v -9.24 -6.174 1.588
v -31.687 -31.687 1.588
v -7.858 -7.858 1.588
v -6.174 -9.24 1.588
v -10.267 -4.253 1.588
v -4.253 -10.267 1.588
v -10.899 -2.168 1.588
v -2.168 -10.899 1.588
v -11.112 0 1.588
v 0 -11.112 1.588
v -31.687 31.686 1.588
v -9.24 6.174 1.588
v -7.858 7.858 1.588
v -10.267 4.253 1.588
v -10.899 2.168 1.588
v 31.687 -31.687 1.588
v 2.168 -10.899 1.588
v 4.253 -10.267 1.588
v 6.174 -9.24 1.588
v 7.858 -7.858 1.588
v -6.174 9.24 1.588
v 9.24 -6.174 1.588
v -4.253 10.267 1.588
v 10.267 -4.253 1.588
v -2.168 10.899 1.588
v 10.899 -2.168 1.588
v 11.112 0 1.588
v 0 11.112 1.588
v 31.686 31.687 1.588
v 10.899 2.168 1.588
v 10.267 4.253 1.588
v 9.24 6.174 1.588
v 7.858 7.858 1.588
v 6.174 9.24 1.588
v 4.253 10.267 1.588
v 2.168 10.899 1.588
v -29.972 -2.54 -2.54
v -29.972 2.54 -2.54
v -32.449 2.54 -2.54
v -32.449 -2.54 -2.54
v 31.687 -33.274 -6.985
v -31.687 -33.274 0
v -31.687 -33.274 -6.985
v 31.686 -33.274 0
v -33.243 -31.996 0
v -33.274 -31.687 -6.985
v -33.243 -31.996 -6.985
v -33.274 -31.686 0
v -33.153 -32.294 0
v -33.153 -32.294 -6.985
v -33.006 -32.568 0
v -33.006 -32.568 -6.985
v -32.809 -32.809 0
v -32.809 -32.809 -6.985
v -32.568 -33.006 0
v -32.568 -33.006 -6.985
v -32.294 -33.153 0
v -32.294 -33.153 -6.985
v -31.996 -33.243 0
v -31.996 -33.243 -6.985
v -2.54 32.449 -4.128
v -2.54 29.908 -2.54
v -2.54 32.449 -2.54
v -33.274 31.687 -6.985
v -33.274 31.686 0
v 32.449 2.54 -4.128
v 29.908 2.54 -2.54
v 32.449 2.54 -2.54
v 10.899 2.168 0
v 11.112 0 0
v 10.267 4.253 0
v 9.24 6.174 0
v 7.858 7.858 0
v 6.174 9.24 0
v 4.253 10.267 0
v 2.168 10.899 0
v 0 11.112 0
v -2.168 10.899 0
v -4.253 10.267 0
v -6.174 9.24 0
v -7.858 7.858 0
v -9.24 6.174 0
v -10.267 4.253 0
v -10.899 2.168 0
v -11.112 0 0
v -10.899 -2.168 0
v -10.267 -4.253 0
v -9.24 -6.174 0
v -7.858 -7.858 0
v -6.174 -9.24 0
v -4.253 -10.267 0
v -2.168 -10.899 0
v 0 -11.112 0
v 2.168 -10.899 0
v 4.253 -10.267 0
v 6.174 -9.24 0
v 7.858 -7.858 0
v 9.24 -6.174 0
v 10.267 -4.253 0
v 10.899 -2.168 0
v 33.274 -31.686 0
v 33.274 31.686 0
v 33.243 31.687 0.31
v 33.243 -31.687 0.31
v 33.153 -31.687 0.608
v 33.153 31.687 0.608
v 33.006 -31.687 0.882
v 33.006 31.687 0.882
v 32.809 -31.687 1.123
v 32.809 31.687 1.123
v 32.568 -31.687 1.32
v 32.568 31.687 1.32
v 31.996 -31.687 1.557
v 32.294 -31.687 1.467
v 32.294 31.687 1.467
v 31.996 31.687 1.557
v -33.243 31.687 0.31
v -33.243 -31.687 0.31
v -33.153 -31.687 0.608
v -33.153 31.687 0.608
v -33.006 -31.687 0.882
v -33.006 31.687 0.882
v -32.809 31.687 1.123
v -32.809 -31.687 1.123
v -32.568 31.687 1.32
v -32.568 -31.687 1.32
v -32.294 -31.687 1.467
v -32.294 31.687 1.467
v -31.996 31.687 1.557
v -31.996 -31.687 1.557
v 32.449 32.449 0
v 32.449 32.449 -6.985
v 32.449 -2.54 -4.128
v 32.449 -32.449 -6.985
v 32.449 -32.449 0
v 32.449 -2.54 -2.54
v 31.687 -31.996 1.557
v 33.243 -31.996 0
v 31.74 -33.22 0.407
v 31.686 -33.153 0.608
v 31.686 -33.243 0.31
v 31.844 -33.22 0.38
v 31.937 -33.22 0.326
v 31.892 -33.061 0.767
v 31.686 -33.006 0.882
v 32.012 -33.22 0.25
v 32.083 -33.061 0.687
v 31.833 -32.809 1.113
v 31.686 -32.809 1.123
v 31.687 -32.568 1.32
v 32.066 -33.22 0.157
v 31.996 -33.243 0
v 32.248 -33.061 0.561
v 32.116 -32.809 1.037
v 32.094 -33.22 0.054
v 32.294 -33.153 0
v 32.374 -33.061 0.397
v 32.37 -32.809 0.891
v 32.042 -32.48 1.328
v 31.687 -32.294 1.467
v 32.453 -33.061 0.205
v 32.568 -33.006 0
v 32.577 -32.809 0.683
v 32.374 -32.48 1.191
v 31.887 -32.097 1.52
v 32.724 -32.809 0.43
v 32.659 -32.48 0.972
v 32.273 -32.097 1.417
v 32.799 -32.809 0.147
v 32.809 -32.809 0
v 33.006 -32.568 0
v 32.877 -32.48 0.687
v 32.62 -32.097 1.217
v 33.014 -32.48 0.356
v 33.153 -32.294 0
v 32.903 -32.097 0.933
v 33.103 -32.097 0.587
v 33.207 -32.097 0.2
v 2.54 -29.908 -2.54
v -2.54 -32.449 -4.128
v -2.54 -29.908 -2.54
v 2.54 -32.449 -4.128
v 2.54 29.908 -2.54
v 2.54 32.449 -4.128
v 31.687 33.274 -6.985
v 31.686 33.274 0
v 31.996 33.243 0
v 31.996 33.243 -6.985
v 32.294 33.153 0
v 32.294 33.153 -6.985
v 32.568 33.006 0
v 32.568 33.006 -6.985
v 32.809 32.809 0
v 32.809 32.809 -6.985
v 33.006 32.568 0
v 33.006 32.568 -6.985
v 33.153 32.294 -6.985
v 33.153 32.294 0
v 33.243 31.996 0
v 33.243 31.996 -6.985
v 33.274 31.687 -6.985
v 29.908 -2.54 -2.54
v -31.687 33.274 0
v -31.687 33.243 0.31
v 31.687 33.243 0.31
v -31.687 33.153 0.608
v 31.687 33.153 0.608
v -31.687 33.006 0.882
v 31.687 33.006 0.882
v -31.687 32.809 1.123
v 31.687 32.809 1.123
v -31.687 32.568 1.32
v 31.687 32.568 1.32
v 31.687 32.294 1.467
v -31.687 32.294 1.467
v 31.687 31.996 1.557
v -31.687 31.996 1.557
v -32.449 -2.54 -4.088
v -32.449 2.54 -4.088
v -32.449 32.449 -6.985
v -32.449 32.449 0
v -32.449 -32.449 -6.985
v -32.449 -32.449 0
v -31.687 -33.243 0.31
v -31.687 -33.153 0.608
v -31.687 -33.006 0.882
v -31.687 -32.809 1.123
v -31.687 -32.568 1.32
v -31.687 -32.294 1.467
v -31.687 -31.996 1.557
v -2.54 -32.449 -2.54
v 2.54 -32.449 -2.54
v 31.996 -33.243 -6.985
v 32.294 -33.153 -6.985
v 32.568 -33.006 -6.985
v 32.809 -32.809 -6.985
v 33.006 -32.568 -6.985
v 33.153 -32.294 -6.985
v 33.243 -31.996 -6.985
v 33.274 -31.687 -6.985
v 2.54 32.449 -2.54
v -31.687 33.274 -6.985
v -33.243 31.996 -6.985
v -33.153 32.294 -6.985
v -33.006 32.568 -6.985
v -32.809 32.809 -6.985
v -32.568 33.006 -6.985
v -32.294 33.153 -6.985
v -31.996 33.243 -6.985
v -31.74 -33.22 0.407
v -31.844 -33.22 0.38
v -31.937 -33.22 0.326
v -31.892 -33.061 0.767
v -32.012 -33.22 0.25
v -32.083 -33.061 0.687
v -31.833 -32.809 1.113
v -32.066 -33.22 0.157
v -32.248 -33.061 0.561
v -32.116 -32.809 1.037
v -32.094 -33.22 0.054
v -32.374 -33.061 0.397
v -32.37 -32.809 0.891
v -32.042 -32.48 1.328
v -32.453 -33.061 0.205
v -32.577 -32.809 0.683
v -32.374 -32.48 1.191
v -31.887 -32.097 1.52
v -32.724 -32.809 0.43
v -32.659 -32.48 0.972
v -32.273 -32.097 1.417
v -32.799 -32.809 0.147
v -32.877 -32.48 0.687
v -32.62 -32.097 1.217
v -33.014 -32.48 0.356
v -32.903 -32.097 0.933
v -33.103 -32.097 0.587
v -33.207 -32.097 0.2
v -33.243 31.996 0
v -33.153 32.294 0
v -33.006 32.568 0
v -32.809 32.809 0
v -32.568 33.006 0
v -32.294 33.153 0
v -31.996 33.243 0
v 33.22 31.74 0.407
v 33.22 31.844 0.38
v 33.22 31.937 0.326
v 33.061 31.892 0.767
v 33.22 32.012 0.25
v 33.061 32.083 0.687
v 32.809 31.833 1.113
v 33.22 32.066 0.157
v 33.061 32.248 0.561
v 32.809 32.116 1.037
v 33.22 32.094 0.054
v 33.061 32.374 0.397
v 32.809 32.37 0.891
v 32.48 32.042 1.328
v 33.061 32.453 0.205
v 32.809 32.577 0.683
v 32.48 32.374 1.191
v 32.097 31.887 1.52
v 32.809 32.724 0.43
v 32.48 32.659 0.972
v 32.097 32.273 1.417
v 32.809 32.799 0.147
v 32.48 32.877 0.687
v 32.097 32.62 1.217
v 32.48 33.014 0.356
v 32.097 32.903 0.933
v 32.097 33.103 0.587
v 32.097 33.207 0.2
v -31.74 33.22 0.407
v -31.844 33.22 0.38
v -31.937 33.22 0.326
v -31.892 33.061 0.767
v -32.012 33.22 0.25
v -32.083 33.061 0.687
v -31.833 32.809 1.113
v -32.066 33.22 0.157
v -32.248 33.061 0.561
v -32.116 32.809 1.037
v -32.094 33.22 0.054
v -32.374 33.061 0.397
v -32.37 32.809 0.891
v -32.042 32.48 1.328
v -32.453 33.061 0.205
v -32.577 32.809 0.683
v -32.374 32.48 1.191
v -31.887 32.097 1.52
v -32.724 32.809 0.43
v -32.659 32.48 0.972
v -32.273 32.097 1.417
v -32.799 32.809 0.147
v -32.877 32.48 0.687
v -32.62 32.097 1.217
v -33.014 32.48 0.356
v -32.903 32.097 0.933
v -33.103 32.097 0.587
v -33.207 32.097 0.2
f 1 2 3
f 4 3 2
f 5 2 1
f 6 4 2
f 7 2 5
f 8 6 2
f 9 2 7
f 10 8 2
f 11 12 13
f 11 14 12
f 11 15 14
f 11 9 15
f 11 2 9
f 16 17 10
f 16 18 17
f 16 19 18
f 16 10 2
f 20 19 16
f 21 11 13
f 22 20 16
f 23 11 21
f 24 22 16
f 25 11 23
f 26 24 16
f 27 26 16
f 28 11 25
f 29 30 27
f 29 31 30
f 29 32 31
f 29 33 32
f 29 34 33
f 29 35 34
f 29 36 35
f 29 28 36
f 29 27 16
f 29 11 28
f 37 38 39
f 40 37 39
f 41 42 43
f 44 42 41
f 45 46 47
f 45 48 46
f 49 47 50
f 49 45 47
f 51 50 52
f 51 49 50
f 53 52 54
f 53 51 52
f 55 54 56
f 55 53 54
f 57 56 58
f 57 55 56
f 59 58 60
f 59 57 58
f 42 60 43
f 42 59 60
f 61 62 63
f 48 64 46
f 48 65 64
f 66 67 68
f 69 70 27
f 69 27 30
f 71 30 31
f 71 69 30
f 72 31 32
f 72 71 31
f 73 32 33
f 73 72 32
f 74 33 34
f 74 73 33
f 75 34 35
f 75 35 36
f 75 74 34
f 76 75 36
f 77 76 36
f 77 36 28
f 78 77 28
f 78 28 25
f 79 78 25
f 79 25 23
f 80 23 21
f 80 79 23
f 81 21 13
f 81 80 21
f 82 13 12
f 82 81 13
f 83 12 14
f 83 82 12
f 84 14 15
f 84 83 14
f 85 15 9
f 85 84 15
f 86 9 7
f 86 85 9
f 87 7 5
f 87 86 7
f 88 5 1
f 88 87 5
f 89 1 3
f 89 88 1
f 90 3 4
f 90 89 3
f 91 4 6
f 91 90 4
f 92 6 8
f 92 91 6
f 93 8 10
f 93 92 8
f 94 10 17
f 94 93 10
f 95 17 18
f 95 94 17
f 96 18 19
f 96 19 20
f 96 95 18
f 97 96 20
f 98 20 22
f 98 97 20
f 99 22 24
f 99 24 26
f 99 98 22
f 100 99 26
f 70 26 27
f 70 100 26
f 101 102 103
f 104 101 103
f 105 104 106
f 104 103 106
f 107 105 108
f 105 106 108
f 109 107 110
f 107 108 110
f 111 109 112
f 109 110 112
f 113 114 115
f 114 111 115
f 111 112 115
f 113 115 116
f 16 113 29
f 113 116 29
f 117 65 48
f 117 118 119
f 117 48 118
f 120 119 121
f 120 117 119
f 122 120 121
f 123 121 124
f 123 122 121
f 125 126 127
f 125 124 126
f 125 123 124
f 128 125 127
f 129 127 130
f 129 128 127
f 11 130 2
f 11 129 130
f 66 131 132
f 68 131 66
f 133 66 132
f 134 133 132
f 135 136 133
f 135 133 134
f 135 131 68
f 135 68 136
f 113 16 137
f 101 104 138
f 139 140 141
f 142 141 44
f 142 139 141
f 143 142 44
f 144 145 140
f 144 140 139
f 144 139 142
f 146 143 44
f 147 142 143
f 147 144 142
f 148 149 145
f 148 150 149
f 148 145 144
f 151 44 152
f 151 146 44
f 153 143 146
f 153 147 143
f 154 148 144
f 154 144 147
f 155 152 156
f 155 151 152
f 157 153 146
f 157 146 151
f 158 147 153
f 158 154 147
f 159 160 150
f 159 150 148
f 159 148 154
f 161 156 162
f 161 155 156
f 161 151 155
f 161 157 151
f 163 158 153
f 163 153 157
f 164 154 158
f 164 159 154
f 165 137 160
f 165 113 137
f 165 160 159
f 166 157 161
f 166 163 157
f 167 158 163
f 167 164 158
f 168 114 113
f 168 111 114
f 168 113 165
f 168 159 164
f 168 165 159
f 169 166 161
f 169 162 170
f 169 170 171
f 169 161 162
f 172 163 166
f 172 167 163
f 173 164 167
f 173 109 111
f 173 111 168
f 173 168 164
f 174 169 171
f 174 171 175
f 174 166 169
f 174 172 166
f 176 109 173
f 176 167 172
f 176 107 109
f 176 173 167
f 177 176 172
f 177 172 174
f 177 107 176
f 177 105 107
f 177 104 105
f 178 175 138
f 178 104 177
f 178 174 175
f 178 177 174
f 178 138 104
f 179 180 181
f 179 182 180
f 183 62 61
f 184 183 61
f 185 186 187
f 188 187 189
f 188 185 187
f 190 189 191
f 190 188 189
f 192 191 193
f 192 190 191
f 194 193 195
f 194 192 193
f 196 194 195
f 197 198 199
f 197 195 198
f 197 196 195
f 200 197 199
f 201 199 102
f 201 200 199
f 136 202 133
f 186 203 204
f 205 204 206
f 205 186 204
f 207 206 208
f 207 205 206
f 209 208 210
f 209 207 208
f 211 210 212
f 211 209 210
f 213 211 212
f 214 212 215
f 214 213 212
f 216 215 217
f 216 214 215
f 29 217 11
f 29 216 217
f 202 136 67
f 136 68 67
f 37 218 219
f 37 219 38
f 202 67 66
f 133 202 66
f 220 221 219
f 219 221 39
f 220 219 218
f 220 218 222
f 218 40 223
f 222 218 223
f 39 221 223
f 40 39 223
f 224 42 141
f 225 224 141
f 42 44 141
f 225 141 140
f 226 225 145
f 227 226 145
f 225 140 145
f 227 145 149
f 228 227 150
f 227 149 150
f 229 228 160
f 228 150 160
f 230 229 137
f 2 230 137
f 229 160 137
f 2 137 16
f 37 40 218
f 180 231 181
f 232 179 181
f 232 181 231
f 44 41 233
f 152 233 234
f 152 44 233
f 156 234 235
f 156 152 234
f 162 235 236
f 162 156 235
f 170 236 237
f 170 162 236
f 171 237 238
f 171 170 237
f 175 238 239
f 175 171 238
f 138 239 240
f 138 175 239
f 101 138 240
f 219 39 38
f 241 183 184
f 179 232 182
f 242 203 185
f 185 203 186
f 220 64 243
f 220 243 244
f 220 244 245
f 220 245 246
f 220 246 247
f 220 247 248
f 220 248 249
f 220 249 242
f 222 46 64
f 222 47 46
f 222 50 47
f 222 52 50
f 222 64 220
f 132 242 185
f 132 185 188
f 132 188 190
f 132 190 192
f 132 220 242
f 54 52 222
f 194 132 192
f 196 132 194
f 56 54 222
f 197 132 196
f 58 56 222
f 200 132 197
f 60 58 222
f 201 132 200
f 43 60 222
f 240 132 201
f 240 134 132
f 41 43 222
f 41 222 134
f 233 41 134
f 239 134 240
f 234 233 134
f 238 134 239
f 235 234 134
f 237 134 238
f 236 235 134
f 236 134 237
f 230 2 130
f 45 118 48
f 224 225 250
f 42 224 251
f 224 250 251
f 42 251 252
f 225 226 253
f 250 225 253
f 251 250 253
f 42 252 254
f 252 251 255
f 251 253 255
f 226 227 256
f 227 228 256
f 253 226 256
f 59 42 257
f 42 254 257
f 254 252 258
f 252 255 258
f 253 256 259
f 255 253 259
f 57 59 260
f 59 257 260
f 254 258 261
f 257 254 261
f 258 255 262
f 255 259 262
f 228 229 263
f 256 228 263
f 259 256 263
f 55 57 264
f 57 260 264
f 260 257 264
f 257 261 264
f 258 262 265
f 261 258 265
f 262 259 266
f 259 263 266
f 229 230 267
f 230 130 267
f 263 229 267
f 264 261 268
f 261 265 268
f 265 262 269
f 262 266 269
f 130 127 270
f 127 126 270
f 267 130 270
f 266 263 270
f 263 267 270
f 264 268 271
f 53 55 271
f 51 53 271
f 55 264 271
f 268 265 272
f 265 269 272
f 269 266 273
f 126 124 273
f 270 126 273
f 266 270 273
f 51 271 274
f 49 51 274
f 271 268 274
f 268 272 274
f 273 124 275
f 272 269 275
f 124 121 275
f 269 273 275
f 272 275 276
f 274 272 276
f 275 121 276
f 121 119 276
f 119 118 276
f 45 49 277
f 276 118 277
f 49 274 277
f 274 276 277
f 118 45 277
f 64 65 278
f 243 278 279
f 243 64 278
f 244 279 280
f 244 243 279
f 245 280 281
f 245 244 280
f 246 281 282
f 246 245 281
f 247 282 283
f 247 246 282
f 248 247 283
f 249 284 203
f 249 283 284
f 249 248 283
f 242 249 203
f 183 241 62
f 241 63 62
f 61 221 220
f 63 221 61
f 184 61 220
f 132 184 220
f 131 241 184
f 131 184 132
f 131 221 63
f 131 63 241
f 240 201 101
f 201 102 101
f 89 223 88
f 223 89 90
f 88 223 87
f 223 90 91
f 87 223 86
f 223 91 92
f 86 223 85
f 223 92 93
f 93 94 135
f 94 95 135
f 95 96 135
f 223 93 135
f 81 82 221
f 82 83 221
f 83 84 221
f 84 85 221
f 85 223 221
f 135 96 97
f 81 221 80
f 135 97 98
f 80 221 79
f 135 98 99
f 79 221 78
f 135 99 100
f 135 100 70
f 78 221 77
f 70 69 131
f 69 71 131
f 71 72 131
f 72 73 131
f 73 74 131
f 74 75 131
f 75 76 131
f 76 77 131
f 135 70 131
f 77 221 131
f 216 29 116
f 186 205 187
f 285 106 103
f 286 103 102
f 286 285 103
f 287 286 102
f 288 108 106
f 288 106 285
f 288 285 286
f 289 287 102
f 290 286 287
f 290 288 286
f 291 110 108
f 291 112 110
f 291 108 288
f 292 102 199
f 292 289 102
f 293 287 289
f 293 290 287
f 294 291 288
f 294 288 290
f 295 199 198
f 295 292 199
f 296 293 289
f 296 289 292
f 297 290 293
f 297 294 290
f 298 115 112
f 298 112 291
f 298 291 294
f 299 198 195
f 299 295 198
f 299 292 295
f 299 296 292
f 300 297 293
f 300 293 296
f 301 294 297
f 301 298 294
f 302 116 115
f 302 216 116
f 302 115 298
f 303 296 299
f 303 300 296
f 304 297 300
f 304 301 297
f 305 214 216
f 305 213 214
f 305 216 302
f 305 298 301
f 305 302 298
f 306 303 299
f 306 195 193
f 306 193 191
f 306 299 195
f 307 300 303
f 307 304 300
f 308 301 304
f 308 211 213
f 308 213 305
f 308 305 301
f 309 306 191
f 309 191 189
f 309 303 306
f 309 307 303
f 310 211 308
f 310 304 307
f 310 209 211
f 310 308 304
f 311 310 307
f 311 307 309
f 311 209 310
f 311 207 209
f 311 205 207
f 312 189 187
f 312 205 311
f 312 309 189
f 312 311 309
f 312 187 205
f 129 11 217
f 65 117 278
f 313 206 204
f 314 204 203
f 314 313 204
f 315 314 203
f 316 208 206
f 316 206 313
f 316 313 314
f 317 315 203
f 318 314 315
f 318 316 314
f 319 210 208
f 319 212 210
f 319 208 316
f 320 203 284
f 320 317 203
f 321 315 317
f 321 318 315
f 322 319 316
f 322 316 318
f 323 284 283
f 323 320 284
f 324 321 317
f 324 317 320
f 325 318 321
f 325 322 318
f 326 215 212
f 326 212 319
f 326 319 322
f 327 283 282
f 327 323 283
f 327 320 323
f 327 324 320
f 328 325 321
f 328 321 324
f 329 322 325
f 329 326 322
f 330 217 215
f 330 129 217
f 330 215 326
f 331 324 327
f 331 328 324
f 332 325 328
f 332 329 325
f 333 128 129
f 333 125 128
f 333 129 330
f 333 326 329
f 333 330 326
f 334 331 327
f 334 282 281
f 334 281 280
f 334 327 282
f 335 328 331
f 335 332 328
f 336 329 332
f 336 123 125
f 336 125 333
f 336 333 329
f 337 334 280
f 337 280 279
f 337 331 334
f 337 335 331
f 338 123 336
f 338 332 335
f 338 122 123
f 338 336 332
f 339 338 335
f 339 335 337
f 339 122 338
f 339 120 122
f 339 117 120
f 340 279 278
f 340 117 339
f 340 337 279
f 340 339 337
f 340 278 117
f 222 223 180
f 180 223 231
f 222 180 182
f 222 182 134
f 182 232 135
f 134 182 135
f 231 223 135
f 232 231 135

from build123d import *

# Parameters (mm, degrees)
F0_W     = 66.548
F0_H     = 66.548
F0_R     = 11.1125
F1_DEPTH = 1.5875
F2_W     = 66.548
F2_H     = 66.548
F2_W_2   = 64.897
F2_H_2   = 64.897
F3_DEPTH = 6.985
F5_DEPTH = 2.54
F7_DEPTH = 2.54
F8_R     = 1.5875


with BuildPart() as f1:
    # F0 (on Top) → F1 (new body)
    with BuildSketch(Plane.XY):
        Rectangle(F0_W, F0_H)
        Circle(F0_R, mode=Mode.SUBTRACT)
    extrude(amount=F1_DEPTH)

    # F2 (on face) → F3 (join)
    with BuildSketch(Plane(origin=(0, 0, 0), x_dir=(1, 0, 0), z_dir=(0, 0, -1))):
        Rectangle(F2_W, F2_H)
        Rectangle(F2_W_2, F2_H_2, mode=Mode.SUBTRACT)
    extrude(amount=F3_DEPTH)

    # F4 (on Front) → F5 (join, symmetric)
    with BuildSketch(Plane.XZ):
        Polygon((32.4485, -4.1275), (32.4485, -2.54), (29.9085, -2.54), align=None)
        Polygon((-32.512, -4.1275), (-29.972, -2.54), (-32.512, -2.54), align=None)
    extrude(amount=F5_DEPTH, both=True)

    # F6 (on Right) → F7 (join, symmetric)
    with BuildSketch(Plane.YZ):
        Polygon((32.4485, -4.1275), (32.4485, -2.54), (29.9085, -2.54), align=None)
        Polygon((-32.4485, -4.1275), (-29.9085, -2.54), (-32.4485, -2.54), align=None)
    extrude(amount=F7_DEPTH, both=True)

    # F8
    f8_edges = [f1.edges().sort_by_distance(p)[0] for p in [
        (-33.274, 0, 1.5875),
        (0, 33.274, 1.5875),
        (33.274, 0, 1.5875),
        (0, -33.274, 1.5875),
        (-33.274, 33.274, -2.69875),
        (-33.274, -33.274, -2.69875),
        (33.274, -33.274, -2.69875),
        (33.274, 33.274, -2.69875),
    ]]
    fillet(f8_edges, radius=F8_R)


solid = f1.part
